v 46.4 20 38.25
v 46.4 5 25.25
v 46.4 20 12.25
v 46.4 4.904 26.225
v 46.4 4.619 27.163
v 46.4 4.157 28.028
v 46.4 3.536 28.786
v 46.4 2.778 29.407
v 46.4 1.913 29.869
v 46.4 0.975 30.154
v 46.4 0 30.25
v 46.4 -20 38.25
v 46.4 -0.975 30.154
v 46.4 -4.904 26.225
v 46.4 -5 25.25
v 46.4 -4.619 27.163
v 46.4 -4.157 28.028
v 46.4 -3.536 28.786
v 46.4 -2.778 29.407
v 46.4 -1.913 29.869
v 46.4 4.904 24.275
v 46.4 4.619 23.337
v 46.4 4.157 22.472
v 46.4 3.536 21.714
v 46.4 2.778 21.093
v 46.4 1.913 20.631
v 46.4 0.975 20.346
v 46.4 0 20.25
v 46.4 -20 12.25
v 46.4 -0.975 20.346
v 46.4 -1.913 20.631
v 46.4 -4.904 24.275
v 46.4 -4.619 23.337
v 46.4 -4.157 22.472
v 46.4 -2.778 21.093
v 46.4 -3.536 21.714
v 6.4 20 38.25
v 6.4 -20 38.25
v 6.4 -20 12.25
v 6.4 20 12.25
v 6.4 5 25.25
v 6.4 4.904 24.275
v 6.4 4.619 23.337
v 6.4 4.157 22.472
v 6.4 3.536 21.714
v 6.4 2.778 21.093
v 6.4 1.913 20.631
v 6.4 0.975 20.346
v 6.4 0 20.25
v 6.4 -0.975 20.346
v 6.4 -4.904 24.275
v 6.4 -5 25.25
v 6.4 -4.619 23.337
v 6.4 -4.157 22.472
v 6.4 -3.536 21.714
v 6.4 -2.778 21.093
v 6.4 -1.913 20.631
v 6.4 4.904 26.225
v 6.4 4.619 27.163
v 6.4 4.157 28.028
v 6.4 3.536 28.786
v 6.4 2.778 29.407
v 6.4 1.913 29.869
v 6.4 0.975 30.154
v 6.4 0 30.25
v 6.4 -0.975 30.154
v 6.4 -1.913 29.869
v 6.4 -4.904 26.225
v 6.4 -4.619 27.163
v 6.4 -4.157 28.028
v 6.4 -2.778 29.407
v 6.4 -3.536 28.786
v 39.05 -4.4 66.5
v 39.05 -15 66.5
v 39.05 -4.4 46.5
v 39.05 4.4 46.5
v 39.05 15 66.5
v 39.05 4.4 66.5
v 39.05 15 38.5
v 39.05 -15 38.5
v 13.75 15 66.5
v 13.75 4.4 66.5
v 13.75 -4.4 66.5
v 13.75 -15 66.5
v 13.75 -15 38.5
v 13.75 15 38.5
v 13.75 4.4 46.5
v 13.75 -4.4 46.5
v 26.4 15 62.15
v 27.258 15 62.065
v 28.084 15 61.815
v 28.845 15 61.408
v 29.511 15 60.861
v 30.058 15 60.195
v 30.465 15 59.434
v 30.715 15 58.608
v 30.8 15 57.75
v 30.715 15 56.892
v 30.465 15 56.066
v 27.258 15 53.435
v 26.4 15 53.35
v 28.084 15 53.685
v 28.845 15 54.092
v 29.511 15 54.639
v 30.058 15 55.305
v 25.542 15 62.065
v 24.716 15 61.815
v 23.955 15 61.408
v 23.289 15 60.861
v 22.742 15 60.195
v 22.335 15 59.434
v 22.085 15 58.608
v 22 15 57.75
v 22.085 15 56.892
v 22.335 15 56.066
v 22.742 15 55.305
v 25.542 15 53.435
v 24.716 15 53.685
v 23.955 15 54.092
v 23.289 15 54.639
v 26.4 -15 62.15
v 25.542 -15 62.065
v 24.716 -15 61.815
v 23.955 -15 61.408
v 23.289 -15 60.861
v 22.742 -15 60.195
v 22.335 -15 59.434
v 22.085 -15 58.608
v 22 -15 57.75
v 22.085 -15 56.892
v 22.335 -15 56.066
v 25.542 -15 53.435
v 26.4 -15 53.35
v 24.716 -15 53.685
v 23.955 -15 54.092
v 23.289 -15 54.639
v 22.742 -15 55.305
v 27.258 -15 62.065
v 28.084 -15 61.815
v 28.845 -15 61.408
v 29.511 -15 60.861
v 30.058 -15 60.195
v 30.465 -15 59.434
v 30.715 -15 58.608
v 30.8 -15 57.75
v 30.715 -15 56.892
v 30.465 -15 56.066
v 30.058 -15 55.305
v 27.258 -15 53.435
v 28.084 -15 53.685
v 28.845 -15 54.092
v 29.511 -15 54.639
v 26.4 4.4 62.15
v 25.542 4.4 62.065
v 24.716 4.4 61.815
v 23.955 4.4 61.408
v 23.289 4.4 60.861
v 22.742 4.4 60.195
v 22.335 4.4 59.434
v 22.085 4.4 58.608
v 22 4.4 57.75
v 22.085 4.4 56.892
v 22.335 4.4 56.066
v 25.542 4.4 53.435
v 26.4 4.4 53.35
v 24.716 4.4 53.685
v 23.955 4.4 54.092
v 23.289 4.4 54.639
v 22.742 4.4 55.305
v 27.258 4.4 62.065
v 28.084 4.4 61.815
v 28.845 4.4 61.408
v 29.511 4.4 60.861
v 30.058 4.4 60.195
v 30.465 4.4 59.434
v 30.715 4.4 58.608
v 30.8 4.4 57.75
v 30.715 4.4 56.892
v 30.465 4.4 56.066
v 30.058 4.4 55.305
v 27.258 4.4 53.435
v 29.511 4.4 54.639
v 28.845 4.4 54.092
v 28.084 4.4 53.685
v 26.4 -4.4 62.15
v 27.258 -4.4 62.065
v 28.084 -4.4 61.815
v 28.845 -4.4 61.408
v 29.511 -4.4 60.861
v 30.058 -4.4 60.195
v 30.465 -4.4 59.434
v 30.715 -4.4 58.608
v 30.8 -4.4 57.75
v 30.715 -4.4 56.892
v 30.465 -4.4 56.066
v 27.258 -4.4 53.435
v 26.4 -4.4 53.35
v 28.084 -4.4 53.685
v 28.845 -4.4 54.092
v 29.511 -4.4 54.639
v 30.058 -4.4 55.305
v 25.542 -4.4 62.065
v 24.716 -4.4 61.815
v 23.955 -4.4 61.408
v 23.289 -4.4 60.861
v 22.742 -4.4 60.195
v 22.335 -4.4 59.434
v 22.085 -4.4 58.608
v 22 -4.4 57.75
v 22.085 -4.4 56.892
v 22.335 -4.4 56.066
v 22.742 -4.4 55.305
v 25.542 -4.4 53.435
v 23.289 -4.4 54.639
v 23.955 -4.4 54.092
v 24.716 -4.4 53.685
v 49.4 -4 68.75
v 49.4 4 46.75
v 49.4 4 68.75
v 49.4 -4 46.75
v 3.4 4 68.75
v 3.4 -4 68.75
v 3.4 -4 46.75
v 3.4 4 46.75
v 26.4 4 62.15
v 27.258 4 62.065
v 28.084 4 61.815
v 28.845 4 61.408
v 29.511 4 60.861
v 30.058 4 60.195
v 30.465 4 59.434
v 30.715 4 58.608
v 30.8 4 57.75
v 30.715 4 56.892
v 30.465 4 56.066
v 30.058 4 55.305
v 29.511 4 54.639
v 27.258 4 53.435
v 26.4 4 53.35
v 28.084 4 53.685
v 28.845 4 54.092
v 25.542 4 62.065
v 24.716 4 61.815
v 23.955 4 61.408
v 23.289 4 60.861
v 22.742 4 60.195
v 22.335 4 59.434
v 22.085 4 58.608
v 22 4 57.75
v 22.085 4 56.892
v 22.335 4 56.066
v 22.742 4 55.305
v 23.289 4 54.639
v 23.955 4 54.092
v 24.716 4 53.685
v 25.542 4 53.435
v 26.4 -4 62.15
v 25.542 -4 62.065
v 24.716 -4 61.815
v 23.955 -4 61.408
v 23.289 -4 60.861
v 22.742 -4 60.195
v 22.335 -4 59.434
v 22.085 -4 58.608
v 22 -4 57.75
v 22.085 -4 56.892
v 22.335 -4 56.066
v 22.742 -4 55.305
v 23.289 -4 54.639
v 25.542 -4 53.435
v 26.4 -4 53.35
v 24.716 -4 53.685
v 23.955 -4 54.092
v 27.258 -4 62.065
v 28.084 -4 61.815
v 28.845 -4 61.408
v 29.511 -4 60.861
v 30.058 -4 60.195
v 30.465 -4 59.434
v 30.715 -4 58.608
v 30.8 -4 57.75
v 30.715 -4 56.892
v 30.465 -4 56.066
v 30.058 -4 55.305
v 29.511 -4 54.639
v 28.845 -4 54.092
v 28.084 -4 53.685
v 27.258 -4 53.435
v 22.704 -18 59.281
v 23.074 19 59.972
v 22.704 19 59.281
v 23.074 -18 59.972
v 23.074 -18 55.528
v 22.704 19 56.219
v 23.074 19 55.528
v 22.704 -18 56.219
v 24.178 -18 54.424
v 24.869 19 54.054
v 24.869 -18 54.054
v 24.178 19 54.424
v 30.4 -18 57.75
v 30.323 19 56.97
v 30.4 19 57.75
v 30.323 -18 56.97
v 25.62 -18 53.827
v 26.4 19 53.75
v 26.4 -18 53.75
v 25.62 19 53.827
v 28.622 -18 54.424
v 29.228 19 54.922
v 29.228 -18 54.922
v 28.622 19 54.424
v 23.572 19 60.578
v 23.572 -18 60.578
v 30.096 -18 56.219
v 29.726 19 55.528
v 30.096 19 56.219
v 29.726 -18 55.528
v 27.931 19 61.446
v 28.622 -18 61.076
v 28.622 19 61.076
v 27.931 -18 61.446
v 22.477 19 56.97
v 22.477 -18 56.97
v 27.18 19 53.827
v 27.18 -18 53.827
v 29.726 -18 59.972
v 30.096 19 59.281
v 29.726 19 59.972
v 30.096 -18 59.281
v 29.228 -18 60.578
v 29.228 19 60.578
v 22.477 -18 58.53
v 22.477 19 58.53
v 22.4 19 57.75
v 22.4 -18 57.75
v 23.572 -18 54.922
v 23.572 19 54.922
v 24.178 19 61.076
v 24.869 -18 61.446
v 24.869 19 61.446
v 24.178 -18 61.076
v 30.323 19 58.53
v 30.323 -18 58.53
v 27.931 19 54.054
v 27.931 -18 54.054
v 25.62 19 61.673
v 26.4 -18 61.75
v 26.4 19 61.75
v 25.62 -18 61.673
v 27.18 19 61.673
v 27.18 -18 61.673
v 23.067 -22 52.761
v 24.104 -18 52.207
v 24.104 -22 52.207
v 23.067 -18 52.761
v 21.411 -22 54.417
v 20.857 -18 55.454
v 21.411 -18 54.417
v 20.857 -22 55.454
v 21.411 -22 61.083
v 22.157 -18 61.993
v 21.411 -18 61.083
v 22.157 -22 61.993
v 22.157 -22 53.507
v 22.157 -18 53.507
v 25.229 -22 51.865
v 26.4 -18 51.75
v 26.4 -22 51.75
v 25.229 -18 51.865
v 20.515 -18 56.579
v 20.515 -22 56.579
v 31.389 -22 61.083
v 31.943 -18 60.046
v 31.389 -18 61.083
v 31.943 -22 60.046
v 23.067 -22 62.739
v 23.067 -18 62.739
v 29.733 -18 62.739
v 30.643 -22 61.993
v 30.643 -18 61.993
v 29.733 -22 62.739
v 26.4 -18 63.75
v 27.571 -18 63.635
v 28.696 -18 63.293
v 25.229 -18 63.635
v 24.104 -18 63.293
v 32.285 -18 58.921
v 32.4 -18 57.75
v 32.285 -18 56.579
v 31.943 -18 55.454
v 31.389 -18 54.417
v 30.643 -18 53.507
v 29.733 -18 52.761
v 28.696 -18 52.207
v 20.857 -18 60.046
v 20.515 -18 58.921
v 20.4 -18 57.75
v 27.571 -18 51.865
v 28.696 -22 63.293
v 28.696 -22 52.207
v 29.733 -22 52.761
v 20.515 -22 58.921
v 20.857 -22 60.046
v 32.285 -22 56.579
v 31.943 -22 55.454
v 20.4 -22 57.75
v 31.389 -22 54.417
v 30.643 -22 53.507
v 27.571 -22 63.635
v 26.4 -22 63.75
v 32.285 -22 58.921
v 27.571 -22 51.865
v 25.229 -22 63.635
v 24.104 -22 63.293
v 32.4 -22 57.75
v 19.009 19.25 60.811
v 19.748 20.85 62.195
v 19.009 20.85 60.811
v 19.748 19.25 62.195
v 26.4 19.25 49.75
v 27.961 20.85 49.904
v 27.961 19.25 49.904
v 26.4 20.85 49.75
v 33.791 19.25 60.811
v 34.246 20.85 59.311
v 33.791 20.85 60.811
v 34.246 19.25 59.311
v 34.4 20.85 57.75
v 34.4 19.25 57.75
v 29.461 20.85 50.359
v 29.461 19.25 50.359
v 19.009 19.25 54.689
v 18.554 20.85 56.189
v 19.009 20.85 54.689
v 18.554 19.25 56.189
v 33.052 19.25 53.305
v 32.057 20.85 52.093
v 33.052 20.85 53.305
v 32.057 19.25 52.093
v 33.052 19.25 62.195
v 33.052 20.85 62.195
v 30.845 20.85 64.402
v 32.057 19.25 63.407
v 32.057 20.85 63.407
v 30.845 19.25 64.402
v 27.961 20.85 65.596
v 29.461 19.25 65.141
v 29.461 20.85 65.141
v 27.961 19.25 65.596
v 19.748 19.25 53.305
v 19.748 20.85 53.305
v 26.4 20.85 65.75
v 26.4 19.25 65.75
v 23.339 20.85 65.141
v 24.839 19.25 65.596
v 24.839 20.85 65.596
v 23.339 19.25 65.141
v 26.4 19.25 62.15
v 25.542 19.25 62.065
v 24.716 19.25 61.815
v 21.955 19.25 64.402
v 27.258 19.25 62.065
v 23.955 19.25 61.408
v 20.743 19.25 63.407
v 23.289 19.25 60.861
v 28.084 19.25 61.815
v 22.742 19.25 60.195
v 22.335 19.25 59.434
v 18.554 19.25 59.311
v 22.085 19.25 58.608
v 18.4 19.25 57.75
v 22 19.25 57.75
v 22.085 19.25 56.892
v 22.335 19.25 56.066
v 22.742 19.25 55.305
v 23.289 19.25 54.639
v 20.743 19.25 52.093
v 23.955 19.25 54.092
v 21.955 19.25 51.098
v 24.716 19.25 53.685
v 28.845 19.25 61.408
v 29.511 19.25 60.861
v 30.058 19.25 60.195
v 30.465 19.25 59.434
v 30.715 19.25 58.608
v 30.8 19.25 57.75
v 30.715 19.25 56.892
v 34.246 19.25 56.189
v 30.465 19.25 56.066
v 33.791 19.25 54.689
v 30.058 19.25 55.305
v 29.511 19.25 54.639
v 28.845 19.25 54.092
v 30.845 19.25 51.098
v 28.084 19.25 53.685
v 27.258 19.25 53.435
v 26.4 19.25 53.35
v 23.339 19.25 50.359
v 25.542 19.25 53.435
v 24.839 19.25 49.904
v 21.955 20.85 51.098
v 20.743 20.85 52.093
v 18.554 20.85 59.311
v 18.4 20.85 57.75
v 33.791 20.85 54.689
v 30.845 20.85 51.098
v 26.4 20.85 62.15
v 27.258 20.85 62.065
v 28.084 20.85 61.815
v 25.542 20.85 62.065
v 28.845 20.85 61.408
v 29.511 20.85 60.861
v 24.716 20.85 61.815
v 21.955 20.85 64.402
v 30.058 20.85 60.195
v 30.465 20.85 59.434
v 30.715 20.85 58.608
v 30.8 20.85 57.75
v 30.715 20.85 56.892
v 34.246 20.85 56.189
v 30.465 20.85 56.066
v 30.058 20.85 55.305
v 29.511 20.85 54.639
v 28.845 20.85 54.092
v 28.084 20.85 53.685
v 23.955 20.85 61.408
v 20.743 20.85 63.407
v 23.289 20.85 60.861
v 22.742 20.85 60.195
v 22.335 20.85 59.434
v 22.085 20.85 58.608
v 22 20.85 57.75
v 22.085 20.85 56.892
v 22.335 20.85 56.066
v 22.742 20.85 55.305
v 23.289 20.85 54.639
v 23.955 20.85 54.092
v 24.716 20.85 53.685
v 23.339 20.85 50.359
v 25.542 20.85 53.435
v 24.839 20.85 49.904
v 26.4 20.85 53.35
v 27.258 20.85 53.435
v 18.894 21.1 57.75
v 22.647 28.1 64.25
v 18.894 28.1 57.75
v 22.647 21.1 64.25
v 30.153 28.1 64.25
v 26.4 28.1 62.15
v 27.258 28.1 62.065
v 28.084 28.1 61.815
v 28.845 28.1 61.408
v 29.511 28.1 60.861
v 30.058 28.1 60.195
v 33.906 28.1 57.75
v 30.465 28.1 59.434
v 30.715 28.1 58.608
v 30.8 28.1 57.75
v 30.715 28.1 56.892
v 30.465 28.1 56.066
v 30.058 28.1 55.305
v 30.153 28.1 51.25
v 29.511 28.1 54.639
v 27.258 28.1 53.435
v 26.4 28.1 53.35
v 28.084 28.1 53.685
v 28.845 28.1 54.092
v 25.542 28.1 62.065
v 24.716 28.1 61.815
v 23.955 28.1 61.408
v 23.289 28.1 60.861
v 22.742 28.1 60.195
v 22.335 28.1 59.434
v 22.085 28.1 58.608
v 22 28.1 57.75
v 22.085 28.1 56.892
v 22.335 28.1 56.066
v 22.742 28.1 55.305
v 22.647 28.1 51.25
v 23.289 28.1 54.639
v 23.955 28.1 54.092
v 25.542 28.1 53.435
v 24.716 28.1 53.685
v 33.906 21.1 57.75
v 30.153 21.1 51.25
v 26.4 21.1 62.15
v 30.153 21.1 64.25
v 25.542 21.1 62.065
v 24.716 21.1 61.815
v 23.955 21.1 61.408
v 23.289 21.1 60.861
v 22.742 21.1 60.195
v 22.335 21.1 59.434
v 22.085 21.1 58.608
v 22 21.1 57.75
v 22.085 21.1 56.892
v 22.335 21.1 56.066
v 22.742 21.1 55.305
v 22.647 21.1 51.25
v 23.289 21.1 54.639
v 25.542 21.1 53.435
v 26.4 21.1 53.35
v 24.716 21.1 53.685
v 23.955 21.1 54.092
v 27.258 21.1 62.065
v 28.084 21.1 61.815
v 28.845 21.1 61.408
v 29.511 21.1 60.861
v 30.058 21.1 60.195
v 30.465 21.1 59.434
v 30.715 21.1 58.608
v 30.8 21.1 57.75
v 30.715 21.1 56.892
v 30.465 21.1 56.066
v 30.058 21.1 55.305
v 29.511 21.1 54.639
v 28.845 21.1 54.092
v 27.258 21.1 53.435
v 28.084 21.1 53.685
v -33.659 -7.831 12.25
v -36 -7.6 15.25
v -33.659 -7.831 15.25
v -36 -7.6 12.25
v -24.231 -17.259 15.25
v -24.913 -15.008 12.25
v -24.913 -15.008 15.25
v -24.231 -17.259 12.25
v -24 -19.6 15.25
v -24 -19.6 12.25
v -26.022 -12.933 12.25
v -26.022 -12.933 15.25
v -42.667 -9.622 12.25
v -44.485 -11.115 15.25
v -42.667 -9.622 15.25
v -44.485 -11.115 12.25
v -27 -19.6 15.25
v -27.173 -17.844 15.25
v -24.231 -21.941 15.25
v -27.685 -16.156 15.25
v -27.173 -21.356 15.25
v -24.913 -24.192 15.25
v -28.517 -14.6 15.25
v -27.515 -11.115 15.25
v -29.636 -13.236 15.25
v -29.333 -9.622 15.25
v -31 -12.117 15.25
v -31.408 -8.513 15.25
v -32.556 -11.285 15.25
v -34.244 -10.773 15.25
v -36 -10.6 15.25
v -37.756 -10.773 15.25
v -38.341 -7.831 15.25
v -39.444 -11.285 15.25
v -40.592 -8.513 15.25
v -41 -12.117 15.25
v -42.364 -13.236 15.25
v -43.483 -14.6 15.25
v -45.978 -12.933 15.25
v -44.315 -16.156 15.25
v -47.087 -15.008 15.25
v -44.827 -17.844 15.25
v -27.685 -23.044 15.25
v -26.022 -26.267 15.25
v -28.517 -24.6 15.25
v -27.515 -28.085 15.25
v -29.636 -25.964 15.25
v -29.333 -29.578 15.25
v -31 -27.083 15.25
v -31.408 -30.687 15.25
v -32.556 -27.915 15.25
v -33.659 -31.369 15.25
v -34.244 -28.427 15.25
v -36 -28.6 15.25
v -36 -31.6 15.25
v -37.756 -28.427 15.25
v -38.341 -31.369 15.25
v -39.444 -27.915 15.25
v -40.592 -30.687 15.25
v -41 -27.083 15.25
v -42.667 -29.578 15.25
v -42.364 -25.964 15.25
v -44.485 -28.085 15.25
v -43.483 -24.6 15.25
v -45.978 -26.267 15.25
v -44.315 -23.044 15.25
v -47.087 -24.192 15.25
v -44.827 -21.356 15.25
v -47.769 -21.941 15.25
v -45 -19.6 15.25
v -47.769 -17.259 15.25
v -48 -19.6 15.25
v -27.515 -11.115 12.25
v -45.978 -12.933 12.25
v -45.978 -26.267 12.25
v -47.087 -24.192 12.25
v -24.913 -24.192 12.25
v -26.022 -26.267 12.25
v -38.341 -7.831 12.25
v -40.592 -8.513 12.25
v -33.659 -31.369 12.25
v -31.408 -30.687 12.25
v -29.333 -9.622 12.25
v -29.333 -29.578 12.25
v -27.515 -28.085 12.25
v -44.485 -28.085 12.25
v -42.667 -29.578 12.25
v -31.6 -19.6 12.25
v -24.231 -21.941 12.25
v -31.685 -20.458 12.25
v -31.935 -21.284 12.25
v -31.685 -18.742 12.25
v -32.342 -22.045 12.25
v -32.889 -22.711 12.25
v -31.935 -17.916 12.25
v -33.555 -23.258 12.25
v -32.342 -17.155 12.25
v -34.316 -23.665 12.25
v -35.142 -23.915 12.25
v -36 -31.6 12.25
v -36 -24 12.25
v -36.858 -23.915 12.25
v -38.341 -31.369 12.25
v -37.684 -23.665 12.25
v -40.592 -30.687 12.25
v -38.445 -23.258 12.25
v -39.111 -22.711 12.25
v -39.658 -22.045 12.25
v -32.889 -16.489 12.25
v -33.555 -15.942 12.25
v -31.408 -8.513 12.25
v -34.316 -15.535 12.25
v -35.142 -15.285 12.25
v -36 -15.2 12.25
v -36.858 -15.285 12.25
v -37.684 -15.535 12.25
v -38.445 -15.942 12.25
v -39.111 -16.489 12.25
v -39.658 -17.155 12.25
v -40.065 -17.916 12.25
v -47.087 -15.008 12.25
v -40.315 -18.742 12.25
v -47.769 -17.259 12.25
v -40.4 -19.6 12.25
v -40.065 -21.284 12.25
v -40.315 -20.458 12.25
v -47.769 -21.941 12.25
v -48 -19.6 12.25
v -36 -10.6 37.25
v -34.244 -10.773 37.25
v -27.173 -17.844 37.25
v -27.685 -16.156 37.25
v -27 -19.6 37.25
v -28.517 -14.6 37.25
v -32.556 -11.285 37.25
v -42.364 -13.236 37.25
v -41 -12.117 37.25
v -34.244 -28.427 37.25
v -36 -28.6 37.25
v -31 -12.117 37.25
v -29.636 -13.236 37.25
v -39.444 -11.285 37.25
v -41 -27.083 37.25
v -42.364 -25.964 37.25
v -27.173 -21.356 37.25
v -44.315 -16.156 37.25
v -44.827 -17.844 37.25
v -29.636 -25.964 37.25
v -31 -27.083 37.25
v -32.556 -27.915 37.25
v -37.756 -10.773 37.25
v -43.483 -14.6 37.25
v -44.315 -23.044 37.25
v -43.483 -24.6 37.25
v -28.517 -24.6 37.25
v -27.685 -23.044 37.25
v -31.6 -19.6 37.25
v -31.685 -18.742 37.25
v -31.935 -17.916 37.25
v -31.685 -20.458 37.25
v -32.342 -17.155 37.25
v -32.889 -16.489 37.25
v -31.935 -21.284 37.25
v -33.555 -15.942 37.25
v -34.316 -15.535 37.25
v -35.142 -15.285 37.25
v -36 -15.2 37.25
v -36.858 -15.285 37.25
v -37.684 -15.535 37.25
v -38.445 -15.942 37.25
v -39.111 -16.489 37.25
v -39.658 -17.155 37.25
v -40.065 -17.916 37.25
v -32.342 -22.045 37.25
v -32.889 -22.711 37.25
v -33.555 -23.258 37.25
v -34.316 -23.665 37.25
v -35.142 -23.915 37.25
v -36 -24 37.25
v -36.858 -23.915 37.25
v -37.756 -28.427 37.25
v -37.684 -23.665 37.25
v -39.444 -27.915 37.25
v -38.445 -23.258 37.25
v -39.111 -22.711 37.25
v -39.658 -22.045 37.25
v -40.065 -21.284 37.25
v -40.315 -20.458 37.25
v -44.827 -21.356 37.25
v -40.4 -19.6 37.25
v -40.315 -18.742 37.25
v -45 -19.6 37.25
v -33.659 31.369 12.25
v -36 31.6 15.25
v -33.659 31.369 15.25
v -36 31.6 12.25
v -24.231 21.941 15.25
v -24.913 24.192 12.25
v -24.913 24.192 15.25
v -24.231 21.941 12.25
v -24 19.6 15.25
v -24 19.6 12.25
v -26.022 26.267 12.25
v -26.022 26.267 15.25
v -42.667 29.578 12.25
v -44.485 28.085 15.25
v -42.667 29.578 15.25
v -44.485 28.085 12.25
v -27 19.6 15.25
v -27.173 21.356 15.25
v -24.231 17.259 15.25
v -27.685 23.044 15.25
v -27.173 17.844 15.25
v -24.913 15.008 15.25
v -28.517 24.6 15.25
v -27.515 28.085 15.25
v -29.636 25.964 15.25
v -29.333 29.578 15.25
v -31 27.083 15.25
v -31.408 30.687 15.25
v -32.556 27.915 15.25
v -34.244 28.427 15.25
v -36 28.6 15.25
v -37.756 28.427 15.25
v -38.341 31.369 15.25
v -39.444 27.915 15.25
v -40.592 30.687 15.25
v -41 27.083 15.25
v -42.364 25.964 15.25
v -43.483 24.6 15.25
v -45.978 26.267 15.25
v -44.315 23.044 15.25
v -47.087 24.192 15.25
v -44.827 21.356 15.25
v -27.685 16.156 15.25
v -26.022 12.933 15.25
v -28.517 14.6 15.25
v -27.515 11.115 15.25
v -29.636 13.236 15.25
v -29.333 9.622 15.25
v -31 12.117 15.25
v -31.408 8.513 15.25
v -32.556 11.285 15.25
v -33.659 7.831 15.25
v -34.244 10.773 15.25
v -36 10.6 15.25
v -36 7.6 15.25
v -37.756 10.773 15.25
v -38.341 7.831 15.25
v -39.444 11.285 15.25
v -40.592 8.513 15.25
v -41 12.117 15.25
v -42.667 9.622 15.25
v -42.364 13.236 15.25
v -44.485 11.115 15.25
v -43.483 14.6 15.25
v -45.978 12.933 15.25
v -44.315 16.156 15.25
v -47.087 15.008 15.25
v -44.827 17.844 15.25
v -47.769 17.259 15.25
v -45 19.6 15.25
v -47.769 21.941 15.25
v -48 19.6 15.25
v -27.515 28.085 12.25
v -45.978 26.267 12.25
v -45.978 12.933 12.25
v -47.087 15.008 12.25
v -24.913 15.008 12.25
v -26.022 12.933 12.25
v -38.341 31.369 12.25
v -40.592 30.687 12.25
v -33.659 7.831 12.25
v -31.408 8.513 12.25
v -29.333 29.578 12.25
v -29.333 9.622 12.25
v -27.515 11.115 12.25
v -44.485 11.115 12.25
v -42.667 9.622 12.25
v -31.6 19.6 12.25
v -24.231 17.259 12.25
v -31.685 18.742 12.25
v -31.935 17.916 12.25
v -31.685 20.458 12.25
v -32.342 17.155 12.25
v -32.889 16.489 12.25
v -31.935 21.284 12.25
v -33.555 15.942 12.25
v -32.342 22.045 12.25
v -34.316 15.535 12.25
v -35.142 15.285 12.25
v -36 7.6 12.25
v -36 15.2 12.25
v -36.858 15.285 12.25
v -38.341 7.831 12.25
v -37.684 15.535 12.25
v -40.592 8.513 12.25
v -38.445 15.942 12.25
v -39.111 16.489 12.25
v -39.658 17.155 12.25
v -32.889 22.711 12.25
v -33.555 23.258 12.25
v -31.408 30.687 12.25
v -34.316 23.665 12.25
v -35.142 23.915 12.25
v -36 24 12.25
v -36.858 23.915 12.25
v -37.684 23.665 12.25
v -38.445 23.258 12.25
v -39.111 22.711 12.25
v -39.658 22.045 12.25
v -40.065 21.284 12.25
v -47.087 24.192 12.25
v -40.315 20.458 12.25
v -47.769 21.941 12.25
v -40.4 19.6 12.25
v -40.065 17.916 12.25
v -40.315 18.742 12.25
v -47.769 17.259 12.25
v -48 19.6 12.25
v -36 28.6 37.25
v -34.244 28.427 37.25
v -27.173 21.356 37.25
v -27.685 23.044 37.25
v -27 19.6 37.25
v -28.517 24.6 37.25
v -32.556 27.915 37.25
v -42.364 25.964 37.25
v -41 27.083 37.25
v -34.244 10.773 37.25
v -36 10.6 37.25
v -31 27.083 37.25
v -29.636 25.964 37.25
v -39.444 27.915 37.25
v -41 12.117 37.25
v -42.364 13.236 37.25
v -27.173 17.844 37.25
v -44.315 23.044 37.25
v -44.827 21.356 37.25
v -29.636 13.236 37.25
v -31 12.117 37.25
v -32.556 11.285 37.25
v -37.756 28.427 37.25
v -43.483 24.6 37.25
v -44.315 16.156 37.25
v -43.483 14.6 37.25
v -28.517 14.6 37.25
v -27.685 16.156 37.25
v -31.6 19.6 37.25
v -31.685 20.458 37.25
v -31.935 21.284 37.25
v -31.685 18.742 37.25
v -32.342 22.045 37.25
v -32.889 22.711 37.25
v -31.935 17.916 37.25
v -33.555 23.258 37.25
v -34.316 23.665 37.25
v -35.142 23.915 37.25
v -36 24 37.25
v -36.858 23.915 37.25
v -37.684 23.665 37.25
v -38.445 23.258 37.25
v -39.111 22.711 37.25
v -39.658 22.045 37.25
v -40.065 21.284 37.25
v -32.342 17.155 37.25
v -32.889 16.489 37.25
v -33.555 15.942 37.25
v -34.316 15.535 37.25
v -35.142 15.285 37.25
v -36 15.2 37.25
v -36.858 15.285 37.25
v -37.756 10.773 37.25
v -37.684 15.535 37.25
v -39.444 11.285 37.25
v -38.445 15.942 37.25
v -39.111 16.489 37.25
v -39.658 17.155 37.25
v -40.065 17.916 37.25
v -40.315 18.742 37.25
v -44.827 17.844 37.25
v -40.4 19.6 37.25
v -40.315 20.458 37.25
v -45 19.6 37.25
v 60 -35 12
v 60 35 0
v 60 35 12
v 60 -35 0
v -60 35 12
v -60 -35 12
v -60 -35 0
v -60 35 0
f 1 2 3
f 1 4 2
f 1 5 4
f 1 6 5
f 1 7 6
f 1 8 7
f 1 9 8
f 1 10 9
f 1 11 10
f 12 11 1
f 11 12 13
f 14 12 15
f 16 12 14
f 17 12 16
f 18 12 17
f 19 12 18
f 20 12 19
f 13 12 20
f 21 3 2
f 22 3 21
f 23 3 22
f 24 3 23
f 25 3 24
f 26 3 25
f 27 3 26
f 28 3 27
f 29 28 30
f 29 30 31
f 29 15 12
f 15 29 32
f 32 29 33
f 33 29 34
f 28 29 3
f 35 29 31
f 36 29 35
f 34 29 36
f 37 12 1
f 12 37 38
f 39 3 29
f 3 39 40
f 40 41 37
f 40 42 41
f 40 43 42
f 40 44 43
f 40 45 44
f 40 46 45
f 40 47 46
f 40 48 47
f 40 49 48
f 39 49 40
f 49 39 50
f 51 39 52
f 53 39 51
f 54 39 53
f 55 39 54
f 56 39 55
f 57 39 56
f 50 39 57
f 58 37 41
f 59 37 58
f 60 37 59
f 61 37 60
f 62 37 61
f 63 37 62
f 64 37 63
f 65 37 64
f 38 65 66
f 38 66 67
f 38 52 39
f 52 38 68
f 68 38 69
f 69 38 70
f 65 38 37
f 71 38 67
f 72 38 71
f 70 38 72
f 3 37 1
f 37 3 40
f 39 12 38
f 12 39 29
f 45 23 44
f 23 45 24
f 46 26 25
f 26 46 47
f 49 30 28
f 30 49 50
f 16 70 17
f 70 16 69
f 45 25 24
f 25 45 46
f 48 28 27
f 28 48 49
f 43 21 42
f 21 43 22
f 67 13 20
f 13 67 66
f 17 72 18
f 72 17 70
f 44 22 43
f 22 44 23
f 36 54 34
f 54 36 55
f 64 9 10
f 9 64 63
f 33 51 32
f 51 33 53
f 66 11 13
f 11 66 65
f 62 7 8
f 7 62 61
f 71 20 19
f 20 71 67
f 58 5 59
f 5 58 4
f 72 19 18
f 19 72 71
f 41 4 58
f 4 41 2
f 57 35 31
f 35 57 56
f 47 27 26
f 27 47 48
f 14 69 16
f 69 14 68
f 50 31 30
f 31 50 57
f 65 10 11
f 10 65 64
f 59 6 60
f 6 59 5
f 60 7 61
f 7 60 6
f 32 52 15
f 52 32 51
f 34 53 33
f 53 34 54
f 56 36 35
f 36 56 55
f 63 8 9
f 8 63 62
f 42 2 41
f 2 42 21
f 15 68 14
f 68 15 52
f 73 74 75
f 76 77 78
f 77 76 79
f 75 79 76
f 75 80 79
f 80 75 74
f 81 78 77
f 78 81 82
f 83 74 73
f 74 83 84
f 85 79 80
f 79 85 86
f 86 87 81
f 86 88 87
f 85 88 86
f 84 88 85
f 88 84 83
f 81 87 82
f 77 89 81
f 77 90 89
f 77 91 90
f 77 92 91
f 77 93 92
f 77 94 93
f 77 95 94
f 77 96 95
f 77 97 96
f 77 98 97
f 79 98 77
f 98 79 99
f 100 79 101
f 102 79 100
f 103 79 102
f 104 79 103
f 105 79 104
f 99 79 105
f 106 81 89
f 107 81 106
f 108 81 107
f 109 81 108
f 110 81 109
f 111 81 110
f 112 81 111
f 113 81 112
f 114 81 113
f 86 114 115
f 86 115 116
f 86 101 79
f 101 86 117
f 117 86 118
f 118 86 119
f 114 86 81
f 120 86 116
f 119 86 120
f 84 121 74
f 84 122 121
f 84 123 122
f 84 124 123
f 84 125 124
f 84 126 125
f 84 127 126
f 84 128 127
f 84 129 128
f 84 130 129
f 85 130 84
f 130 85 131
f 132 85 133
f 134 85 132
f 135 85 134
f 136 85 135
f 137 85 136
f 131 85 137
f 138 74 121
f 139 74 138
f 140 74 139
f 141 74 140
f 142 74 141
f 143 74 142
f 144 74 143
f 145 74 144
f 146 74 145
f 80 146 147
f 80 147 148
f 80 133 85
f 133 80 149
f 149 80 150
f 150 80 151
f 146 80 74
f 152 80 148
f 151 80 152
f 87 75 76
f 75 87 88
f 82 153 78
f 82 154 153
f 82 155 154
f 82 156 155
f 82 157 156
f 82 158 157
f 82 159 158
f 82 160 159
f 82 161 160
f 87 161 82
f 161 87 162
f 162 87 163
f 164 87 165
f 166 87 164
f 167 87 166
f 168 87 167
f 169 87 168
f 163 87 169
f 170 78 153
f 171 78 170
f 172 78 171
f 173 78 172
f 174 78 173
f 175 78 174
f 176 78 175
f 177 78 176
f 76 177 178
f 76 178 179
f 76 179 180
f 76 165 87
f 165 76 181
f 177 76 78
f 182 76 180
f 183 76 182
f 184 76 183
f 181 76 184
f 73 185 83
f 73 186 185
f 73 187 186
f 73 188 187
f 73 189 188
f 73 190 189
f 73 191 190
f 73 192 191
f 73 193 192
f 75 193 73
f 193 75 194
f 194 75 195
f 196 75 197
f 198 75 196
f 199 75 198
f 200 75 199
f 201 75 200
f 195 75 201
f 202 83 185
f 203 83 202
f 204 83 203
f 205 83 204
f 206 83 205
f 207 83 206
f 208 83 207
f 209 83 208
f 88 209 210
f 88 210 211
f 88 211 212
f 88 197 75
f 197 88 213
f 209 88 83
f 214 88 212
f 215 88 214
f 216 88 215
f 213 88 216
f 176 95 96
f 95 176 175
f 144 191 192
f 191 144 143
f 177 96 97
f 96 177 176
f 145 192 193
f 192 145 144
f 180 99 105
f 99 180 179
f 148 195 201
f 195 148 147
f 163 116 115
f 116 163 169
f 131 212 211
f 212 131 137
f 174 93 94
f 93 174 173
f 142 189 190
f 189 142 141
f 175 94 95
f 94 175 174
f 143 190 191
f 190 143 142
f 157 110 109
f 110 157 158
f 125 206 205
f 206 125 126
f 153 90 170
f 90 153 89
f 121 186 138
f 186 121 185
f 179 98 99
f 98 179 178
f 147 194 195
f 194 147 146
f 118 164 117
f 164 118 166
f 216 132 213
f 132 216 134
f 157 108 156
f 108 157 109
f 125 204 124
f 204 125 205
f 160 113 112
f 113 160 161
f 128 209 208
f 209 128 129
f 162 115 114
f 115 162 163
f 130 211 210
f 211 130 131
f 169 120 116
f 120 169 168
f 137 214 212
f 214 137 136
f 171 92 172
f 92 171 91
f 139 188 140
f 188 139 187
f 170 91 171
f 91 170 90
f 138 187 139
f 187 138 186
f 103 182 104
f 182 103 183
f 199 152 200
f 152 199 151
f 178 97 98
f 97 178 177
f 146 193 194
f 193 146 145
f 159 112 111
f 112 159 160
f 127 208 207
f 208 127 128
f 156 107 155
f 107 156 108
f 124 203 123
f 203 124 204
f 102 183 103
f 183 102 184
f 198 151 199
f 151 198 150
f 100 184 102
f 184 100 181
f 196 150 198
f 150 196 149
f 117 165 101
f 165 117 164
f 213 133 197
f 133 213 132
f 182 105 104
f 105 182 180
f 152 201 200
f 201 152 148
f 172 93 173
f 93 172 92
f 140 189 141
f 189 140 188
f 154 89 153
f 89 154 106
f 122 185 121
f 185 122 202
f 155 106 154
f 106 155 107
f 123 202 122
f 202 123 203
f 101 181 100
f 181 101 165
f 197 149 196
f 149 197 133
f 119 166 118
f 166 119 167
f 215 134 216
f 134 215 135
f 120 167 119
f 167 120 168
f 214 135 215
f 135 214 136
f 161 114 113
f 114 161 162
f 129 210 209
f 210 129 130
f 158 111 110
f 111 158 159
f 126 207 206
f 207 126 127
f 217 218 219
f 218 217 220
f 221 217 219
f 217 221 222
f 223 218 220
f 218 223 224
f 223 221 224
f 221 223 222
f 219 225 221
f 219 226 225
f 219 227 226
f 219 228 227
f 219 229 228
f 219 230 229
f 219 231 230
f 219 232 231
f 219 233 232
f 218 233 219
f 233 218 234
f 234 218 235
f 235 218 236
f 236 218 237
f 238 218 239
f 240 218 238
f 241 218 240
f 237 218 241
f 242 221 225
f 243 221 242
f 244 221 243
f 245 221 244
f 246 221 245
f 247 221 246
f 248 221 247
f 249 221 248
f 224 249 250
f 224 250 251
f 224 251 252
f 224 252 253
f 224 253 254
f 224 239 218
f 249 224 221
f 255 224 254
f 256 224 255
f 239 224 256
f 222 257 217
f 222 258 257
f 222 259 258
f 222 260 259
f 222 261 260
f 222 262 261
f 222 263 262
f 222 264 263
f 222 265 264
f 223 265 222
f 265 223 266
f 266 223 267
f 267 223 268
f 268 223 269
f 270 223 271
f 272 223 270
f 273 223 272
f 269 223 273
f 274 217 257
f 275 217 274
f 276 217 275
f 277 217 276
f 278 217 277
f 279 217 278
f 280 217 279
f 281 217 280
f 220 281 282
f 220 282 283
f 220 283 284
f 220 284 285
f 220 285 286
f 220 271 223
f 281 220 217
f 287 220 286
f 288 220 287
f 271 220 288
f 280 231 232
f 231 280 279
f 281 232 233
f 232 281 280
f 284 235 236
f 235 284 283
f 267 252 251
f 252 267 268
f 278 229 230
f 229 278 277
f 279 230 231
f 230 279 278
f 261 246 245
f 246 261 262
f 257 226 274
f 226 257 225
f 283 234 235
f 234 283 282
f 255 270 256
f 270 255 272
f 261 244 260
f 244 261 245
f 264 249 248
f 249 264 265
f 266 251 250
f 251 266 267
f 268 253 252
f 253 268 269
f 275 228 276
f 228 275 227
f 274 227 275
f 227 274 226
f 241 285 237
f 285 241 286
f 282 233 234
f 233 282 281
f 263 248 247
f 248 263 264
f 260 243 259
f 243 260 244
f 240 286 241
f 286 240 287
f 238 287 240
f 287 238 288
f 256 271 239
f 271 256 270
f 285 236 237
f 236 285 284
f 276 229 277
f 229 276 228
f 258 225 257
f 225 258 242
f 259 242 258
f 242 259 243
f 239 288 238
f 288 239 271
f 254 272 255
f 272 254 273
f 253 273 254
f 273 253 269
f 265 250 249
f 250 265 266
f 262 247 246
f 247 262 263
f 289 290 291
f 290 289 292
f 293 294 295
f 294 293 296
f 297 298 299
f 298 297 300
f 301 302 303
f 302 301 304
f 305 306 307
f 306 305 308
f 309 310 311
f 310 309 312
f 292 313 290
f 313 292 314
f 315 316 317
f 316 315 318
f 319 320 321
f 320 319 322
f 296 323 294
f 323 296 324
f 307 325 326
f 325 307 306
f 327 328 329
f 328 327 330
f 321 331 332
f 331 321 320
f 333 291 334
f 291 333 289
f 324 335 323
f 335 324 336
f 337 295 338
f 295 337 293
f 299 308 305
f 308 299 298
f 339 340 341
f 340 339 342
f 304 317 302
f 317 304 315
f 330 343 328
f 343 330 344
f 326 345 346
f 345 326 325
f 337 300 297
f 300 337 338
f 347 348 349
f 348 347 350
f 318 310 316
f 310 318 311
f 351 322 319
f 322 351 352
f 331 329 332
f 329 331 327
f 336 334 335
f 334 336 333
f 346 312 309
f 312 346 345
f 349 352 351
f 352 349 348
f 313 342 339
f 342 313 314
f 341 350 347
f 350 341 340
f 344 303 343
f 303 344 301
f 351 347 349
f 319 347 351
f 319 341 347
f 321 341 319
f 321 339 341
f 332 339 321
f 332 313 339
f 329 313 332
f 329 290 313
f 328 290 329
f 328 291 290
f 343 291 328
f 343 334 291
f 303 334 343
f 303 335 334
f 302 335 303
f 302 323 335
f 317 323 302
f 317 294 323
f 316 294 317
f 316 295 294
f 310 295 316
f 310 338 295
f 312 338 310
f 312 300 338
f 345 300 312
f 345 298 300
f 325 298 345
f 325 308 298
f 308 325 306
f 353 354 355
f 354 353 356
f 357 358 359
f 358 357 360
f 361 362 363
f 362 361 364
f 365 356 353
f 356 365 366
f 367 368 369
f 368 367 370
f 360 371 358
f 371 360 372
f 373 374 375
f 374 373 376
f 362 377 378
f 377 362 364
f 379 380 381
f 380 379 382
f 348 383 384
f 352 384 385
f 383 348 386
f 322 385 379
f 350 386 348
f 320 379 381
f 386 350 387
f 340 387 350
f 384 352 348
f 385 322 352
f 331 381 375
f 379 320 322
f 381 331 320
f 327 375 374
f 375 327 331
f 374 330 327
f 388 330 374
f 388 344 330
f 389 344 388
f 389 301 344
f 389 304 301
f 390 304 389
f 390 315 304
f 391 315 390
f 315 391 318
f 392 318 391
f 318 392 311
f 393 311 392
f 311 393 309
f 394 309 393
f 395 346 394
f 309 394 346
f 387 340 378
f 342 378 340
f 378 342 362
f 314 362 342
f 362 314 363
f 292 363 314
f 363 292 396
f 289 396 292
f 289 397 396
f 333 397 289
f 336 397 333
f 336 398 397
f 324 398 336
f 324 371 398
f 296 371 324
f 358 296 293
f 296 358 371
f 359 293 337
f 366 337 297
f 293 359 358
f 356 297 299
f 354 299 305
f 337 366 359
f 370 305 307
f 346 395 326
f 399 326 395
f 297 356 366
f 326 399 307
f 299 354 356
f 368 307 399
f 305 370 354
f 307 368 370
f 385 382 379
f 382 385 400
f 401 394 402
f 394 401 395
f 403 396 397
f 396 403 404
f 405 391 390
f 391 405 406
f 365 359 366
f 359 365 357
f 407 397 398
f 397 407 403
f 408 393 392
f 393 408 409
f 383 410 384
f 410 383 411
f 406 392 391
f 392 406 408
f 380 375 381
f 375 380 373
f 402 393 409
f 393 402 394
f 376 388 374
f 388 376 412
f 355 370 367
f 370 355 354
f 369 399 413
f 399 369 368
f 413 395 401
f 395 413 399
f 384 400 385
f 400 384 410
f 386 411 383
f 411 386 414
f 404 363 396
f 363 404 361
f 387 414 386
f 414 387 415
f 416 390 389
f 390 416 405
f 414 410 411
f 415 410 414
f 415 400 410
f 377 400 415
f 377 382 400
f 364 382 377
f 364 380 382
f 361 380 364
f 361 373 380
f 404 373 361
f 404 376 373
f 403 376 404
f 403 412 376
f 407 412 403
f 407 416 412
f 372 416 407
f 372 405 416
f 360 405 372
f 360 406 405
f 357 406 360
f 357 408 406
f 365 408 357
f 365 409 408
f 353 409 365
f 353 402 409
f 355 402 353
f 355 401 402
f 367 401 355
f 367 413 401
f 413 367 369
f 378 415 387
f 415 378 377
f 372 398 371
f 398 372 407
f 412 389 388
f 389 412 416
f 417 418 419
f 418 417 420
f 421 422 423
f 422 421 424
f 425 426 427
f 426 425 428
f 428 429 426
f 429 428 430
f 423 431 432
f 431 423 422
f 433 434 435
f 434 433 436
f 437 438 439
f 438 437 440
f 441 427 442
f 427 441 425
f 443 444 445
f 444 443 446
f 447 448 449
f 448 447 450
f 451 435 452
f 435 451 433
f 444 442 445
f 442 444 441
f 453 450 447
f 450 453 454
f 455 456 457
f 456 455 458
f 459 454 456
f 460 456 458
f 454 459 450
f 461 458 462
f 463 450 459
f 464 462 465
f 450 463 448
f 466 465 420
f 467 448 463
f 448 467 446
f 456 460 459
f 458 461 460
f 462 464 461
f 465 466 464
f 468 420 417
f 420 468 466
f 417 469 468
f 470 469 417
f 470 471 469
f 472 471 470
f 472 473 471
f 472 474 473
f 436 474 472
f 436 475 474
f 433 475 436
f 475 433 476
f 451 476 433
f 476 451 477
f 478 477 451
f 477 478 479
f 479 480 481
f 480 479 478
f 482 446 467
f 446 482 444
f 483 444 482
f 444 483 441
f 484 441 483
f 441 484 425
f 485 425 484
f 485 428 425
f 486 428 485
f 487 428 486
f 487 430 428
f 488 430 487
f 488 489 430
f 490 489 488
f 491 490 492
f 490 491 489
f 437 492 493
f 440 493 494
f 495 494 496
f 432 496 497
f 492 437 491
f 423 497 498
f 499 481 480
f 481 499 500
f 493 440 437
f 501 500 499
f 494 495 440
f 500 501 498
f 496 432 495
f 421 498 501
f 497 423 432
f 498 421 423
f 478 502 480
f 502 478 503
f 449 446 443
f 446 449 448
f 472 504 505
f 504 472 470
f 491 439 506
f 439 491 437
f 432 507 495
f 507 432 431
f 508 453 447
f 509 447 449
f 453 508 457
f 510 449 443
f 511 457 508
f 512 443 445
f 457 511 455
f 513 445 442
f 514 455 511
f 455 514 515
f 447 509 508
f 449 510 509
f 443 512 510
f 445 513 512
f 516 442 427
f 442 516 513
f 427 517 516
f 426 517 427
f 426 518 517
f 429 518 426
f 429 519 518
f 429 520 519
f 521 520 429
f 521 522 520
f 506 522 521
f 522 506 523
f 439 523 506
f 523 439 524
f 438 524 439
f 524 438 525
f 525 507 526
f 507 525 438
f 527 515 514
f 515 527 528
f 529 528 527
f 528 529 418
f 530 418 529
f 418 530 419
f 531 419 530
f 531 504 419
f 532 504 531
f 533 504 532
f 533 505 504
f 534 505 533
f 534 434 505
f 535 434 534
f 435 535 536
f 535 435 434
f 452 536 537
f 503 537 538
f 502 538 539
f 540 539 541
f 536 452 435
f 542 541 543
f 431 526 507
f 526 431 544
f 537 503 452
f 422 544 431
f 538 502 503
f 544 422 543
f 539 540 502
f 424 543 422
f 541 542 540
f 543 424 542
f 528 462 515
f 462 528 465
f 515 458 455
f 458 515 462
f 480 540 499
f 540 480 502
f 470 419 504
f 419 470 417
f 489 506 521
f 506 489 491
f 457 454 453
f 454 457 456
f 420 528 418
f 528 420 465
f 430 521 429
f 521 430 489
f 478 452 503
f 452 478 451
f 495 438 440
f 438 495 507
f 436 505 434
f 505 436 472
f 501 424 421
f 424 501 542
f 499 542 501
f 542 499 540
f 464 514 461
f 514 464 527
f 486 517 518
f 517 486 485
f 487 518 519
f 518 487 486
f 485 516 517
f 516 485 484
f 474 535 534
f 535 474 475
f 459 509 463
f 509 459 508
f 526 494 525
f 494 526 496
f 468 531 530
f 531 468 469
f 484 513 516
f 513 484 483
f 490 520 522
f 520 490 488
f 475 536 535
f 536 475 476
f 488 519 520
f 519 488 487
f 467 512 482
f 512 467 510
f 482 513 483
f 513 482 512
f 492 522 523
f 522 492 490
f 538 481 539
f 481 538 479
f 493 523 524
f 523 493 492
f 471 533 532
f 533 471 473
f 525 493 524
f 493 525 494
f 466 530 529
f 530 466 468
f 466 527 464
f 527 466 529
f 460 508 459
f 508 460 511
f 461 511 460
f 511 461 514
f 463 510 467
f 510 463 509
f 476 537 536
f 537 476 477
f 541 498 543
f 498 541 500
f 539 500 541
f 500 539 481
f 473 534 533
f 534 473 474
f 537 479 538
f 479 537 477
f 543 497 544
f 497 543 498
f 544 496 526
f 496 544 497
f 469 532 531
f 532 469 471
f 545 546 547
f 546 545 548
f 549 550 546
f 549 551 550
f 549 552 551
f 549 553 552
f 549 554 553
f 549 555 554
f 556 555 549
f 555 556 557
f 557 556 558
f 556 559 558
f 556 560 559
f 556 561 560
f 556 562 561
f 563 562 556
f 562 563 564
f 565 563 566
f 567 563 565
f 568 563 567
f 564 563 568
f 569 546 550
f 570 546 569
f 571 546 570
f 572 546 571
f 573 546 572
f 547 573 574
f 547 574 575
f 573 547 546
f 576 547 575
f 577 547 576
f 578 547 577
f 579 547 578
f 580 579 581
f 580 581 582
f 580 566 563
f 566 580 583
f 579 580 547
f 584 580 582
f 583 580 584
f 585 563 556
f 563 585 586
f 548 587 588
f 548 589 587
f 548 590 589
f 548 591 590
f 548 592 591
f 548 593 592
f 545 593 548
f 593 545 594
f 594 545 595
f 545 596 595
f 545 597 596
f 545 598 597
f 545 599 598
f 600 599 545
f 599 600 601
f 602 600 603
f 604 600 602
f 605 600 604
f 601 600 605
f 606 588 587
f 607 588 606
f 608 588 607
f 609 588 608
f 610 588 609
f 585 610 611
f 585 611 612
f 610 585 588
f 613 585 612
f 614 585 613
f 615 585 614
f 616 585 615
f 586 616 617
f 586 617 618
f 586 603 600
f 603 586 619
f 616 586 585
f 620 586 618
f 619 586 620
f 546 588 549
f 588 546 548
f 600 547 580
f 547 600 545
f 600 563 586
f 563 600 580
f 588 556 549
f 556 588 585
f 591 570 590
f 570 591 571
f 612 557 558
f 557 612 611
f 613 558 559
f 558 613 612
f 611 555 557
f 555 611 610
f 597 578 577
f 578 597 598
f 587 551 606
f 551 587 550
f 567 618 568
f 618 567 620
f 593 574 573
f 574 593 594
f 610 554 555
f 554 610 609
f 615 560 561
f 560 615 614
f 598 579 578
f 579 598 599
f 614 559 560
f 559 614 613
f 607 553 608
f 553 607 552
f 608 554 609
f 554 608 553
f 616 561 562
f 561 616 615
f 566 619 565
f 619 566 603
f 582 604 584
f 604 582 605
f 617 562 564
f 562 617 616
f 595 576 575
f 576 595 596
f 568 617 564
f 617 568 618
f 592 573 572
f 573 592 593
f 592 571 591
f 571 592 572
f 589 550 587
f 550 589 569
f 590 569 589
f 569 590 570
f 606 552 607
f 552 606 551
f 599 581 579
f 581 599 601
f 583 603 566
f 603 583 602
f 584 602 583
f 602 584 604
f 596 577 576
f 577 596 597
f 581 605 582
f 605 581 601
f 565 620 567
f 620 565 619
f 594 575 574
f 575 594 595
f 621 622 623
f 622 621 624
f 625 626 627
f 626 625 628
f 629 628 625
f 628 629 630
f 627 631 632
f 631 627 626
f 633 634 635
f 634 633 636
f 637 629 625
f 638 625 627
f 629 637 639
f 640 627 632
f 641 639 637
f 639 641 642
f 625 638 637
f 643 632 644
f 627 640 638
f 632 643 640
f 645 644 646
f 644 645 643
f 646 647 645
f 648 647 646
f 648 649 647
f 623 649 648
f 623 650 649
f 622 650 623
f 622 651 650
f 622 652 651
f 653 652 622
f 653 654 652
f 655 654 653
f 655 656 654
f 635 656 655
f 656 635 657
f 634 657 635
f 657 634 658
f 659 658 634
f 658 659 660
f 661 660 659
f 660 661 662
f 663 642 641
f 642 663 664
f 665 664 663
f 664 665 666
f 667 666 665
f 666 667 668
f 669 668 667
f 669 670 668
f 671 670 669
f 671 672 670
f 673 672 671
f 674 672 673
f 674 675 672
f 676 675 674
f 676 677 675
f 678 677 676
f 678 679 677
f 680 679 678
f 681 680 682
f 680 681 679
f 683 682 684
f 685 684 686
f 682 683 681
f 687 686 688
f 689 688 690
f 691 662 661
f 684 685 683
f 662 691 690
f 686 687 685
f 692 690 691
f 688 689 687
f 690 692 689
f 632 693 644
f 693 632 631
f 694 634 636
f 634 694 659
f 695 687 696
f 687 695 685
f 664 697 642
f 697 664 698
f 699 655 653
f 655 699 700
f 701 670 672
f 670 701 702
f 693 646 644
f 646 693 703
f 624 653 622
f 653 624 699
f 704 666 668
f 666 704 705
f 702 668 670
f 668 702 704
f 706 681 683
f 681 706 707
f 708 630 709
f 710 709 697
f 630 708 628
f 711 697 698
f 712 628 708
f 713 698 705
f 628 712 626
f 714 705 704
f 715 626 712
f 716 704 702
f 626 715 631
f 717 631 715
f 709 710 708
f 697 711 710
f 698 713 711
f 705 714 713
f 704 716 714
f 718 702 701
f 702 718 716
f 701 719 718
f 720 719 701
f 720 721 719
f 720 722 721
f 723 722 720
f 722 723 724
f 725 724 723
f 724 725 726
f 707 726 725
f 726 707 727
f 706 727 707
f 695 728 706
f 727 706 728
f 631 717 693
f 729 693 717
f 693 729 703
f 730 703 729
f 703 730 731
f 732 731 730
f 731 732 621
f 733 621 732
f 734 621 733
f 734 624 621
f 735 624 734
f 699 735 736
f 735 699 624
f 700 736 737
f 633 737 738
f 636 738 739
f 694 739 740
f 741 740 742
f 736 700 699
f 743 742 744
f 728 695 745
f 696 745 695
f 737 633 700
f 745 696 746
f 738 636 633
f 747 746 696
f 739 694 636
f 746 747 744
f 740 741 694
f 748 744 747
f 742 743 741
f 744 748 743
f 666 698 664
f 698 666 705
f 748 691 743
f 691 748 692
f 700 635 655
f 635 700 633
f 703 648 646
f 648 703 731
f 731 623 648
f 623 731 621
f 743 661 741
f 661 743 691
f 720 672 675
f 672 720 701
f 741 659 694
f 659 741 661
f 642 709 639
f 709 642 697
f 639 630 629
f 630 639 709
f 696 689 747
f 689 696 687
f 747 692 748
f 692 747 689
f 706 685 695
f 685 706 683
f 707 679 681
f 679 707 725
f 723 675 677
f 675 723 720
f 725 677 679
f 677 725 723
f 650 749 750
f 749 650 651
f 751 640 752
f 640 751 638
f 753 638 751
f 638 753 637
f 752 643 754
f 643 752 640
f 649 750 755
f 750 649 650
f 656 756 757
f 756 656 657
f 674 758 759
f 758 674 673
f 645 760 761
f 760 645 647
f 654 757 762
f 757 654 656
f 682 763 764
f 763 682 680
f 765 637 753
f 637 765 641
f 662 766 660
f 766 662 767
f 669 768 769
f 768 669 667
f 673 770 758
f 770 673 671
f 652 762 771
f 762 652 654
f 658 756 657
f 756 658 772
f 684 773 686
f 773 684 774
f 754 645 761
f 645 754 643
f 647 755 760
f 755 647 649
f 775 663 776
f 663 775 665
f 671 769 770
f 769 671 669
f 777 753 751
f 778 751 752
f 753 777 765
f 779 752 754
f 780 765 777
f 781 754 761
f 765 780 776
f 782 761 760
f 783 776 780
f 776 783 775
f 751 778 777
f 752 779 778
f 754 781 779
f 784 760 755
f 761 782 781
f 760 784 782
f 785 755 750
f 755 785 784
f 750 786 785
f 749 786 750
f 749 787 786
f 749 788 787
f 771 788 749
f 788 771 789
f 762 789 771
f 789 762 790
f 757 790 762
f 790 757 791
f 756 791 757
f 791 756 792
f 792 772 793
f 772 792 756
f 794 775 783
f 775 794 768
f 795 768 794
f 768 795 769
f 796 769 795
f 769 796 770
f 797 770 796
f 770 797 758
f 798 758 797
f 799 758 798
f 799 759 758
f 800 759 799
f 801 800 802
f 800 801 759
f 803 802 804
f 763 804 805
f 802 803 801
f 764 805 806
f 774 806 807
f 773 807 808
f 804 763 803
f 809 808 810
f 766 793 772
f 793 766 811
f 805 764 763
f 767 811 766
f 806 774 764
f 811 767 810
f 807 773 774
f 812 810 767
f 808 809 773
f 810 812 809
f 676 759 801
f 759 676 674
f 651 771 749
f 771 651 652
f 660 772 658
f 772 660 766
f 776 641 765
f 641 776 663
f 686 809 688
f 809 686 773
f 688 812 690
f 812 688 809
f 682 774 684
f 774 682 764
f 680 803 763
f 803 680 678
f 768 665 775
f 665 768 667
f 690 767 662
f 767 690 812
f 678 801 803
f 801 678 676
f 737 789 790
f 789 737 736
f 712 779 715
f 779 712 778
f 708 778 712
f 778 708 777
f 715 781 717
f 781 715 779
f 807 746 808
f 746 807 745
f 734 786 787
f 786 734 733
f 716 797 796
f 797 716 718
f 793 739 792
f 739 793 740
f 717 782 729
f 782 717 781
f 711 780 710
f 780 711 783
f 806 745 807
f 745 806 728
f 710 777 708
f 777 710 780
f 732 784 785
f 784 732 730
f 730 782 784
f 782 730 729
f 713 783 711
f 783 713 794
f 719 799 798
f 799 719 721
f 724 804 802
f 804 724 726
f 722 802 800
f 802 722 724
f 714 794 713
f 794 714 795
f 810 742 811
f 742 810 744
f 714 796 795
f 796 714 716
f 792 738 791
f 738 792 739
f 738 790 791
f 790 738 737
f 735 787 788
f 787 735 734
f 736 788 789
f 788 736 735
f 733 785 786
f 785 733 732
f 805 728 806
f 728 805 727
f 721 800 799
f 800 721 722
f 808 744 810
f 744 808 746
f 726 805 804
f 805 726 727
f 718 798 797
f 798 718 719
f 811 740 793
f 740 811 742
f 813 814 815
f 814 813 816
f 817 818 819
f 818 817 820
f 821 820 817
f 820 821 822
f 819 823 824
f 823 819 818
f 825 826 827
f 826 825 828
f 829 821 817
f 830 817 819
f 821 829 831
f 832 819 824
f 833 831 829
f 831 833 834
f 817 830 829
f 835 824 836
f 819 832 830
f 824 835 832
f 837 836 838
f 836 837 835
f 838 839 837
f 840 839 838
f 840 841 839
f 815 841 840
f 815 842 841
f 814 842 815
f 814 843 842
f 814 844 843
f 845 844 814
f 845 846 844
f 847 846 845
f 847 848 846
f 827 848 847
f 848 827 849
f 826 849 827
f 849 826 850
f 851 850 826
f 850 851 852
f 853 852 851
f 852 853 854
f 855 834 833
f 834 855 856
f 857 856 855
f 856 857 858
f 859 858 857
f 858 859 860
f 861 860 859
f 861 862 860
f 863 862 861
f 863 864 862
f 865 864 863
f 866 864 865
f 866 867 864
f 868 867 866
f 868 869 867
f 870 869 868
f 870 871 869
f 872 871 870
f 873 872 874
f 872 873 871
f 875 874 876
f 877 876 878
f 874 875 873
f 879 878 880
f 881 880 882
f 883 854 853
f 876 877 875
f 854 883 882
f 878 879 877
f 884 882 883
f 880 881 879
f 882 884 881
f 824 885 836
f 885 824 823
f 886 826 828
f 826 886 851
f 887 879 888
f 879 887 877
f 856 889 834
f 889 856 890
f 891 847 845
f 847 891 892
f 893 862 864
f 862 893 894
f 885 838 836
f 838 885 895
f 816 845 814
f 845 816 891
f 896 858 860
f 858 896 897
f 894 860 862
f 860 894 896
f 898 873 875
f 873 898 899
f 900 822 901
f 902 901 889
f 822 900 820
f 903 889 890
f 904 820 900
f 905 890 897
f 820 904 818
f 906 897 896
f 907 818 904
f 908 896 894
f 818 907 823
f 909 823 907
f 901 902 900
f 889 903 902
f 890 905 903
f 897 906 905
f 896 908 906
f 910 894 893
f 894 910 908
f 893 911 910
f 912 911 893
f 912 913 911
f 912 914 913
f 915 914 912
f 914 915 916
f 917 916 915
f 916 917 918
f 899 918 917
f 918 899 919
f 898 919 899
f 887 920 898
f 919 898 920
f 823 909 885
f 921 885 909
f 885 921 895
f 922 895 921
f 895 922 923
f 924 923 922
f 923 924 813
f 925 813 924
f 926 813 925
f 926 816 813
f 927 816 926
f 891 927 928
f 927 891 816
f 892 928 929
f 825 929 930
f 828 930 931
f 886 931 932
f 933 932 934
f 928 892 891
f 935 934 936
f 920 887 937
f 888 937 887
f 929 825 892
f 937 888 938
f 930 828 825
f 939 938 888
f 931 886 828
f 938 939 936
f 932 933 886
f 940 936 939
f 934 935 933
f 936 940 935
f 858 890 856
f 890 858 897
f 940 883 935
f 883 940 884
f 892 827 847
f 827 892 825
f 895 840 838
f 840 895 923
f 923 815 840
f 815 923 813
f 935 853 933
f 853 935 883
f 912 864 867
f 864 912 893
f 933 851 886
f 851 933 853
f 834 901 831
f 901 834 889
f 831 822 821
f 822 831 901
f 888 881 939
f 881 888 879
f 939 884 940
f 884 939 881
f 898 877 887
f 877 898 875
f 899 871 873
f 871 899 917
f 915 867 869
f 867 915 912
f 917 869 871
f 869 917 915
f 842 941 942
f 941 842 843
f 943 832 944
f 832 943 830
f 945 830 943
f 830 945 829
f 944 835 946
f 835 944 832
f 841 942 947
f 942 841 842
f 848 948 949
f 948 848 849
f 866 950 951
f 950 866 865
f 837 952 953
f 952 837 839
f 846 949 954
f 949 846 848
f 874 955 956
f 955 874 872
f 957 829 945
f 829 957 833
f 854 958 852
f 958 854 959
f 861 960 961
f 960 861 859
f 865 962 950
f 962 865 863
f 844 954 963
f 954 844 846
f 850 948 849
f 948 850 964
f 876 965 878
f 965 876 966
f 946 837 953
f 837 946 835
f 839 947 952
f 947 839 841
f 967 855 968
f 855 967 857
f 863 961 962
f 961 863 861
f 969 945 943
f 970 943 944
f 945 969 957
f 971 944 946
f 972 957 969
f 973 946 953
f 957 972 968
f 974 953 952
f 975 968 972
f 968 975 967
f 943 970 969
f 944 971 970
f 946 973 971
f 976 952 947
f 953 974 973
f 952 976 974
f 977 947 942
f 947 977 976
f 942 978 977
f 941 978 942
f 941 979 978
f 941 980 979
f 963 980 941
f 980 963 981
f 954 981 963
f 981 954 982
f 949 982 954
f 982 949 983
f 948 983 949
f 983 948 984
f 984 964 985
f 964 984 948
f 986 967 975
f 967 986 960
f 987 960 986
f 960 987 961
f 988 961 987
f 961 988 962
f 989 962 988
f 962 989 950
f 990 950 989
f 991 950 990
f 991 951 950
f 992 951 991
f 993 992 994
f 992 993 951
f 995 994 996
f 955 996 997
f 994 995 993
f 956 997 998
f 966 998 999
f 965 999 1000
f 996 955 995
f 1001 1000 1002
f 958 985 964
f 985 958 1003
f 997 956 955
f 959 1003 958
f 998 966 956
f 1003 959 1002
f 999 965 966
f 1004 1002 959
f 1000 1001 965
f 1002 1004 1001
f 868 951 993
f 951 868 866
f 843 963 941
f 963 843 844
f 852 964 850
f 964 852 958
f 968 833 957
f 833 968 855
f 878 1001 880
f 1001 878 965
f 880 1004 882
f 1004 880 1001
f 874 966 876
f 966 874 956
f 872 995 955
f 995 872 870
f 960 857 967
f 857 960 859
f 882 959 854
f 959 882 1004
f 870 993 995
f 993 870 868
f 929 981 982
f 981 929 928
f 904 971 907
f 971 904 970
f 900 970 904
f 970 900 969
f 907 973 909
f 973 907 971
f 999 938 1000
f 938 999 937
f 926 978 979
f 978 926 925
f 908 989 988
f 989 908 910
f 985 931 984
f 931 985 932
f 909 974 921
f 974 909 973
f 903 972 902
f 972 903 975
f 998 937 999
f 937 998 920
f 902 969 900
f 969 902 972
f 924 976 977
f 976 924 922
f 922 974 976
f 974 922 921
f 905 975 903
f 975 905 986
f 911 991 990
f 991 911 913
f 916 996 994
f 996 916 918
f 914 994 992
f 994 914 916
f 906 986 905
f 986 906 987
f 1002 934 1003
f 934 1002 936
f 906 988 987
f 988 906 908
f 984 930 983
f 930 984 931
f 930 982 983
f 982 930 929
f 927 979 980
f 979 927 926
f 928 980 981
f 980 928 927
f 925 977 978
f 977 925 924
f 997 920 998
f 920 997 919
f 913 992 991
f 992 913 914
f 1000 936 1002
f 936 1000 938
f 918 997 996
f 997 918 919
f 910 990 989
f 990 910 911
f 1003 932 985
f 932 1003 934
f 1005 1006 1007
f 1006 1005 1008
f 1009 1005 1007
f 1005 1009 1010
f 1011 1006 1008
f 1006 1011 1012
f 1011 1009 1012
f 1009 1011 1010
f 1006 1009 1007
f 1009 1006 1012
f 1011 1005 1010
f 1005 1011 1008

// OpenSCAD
$fn = 32;

// ------------------------------------------------------------------------
// Indexing jig: plate 120 x 70 mm, pin d8
// Every part is its own module, assembly() places every instance.
// ------------------------------------------------------------------------

// --- part 1 ---
module jig_plate() {
  difference() {
    translate([-60, -35, 0]) cube([120, 70, 12]);
  }
}

// --- part 2 ---
module locator_block() {
  difference() {
    translate([-20, -20, 0]) cube([40, 40, 26]);
    translate([0, 0, 13]) rotate([0, 90, 0]) cylinder(h = 42, d = 10, center = true);
  }
}

// --- part 3 ---
module index_fork() {
  difference() {
    translate([-12.65, -15, 0]) cube([25.3, 30, 28]);
    translate([-13.65, -4.4, 8]) cube([27.3, 8.8, 21]);
    translate([0, 0, 19.25]) rotate([90, 0, 0]) cylinder(h = 32, d = 8.8, center = true);
  }
}

// --- part 4 ---
module index_arm() {
  difference() {
    translate([-23, -4, 0]) cube([46, 8, 22]);
    translate([0, 0, 11]) rotate([90, 0, 0]) cylinder(h = 10, d = 8.8, center = true);
  }
}

// --- part 5 ---
module index_pin() {
  rotate([0, 90, 0]) cylinder(h = 38, d = 8, center = true);
  translate([-22, 0, 0]) rotate([0, 90, 0]) cylinder(h = 4, d = 12);
}

// --- part 6 ---
module pin_washer() {
  difference() {
      translate([0, 0, 0]) cylinder(h = 1.6, d = 16);
      translate([0, 0, -1]) cylinder(h = 3.6, d = 8.8);
    }
}

// --- part 7 ---
module lock_nut() {
  difference() {
    linear_extrude(height = 7) polygon(points = [[7.506, 0], [3.753, 6.5], [-3.753, 6.5], [-7.506, 0], [-3.753, -6.5], [3.753, -6.5]]);
    translate([0, 0, -1]) cylinder(h = 9, d = 8.8);
  }
}

// --- part 8 ---
module guide_bush_a() {
  difference() {
    union() {
      cylinder(h = 3, d = 24);
      translate([0, 0, 3]) cylinder(h = 22, d = 18);
    }
    translate([0, 0, -1]) cylinder(h = 27, d = 8.8);
  }
}

// --- part 9 ---
module guide_bush_b() {
  difference() {
    union() {
      cylinder(h = 3, d = 24);
      translate([0, 0, 3]) cylinder(h = 22, d = 18);
    }
    translate([0, 0, -1]) cylinder(h = 27, d = 8.8);
  }
}

// --- assembly ---
module assembly() {
  color([0.80, 0.24, 0.20]) translate([0, 0, 0]) rotate([0, 0, 0]) jig_plate();
  color([0.20, 0.45, 0.75]) translate([26.4, 0, 12.25]) rotate([0, 0, 0]) locator_block();
  color([0.25, 0.62, 0.32]) translate([26.4, 0, 38.5]) rotate([0, 0, 0]) index_fork();
  color([0.92, 0.70, 0.18]) translate([26.4, 0, 46.75]) rotate([0, 0, 0]) index_arm();
  color([0.58, 0.35, 0.70]) translate([26.4, 0, 57.75]) rotate([0, 0, 90]) index_pin();
  color([0.16, 0.66, 0.66]) translate([26.4, 20.85, 57.75]) rotate([90, 0, 0]) pin_washer();
  color([0.85, 0.48, 0.18]) translate([26.4, 28.1, 57.75]) rotate([90, 0, 0]) lock_nut();
  color([0.55, 0.60, 0.65]) translate([-36, -19.6, 12.25]) rotate([0, 0, 0]) guide_bush_a();
  color([0.75, 0.30, 0.55]) translate([-36, 19.6, 12.25]) rotate([0, 0, 0]) guide_bush_b();
}

assembly();
